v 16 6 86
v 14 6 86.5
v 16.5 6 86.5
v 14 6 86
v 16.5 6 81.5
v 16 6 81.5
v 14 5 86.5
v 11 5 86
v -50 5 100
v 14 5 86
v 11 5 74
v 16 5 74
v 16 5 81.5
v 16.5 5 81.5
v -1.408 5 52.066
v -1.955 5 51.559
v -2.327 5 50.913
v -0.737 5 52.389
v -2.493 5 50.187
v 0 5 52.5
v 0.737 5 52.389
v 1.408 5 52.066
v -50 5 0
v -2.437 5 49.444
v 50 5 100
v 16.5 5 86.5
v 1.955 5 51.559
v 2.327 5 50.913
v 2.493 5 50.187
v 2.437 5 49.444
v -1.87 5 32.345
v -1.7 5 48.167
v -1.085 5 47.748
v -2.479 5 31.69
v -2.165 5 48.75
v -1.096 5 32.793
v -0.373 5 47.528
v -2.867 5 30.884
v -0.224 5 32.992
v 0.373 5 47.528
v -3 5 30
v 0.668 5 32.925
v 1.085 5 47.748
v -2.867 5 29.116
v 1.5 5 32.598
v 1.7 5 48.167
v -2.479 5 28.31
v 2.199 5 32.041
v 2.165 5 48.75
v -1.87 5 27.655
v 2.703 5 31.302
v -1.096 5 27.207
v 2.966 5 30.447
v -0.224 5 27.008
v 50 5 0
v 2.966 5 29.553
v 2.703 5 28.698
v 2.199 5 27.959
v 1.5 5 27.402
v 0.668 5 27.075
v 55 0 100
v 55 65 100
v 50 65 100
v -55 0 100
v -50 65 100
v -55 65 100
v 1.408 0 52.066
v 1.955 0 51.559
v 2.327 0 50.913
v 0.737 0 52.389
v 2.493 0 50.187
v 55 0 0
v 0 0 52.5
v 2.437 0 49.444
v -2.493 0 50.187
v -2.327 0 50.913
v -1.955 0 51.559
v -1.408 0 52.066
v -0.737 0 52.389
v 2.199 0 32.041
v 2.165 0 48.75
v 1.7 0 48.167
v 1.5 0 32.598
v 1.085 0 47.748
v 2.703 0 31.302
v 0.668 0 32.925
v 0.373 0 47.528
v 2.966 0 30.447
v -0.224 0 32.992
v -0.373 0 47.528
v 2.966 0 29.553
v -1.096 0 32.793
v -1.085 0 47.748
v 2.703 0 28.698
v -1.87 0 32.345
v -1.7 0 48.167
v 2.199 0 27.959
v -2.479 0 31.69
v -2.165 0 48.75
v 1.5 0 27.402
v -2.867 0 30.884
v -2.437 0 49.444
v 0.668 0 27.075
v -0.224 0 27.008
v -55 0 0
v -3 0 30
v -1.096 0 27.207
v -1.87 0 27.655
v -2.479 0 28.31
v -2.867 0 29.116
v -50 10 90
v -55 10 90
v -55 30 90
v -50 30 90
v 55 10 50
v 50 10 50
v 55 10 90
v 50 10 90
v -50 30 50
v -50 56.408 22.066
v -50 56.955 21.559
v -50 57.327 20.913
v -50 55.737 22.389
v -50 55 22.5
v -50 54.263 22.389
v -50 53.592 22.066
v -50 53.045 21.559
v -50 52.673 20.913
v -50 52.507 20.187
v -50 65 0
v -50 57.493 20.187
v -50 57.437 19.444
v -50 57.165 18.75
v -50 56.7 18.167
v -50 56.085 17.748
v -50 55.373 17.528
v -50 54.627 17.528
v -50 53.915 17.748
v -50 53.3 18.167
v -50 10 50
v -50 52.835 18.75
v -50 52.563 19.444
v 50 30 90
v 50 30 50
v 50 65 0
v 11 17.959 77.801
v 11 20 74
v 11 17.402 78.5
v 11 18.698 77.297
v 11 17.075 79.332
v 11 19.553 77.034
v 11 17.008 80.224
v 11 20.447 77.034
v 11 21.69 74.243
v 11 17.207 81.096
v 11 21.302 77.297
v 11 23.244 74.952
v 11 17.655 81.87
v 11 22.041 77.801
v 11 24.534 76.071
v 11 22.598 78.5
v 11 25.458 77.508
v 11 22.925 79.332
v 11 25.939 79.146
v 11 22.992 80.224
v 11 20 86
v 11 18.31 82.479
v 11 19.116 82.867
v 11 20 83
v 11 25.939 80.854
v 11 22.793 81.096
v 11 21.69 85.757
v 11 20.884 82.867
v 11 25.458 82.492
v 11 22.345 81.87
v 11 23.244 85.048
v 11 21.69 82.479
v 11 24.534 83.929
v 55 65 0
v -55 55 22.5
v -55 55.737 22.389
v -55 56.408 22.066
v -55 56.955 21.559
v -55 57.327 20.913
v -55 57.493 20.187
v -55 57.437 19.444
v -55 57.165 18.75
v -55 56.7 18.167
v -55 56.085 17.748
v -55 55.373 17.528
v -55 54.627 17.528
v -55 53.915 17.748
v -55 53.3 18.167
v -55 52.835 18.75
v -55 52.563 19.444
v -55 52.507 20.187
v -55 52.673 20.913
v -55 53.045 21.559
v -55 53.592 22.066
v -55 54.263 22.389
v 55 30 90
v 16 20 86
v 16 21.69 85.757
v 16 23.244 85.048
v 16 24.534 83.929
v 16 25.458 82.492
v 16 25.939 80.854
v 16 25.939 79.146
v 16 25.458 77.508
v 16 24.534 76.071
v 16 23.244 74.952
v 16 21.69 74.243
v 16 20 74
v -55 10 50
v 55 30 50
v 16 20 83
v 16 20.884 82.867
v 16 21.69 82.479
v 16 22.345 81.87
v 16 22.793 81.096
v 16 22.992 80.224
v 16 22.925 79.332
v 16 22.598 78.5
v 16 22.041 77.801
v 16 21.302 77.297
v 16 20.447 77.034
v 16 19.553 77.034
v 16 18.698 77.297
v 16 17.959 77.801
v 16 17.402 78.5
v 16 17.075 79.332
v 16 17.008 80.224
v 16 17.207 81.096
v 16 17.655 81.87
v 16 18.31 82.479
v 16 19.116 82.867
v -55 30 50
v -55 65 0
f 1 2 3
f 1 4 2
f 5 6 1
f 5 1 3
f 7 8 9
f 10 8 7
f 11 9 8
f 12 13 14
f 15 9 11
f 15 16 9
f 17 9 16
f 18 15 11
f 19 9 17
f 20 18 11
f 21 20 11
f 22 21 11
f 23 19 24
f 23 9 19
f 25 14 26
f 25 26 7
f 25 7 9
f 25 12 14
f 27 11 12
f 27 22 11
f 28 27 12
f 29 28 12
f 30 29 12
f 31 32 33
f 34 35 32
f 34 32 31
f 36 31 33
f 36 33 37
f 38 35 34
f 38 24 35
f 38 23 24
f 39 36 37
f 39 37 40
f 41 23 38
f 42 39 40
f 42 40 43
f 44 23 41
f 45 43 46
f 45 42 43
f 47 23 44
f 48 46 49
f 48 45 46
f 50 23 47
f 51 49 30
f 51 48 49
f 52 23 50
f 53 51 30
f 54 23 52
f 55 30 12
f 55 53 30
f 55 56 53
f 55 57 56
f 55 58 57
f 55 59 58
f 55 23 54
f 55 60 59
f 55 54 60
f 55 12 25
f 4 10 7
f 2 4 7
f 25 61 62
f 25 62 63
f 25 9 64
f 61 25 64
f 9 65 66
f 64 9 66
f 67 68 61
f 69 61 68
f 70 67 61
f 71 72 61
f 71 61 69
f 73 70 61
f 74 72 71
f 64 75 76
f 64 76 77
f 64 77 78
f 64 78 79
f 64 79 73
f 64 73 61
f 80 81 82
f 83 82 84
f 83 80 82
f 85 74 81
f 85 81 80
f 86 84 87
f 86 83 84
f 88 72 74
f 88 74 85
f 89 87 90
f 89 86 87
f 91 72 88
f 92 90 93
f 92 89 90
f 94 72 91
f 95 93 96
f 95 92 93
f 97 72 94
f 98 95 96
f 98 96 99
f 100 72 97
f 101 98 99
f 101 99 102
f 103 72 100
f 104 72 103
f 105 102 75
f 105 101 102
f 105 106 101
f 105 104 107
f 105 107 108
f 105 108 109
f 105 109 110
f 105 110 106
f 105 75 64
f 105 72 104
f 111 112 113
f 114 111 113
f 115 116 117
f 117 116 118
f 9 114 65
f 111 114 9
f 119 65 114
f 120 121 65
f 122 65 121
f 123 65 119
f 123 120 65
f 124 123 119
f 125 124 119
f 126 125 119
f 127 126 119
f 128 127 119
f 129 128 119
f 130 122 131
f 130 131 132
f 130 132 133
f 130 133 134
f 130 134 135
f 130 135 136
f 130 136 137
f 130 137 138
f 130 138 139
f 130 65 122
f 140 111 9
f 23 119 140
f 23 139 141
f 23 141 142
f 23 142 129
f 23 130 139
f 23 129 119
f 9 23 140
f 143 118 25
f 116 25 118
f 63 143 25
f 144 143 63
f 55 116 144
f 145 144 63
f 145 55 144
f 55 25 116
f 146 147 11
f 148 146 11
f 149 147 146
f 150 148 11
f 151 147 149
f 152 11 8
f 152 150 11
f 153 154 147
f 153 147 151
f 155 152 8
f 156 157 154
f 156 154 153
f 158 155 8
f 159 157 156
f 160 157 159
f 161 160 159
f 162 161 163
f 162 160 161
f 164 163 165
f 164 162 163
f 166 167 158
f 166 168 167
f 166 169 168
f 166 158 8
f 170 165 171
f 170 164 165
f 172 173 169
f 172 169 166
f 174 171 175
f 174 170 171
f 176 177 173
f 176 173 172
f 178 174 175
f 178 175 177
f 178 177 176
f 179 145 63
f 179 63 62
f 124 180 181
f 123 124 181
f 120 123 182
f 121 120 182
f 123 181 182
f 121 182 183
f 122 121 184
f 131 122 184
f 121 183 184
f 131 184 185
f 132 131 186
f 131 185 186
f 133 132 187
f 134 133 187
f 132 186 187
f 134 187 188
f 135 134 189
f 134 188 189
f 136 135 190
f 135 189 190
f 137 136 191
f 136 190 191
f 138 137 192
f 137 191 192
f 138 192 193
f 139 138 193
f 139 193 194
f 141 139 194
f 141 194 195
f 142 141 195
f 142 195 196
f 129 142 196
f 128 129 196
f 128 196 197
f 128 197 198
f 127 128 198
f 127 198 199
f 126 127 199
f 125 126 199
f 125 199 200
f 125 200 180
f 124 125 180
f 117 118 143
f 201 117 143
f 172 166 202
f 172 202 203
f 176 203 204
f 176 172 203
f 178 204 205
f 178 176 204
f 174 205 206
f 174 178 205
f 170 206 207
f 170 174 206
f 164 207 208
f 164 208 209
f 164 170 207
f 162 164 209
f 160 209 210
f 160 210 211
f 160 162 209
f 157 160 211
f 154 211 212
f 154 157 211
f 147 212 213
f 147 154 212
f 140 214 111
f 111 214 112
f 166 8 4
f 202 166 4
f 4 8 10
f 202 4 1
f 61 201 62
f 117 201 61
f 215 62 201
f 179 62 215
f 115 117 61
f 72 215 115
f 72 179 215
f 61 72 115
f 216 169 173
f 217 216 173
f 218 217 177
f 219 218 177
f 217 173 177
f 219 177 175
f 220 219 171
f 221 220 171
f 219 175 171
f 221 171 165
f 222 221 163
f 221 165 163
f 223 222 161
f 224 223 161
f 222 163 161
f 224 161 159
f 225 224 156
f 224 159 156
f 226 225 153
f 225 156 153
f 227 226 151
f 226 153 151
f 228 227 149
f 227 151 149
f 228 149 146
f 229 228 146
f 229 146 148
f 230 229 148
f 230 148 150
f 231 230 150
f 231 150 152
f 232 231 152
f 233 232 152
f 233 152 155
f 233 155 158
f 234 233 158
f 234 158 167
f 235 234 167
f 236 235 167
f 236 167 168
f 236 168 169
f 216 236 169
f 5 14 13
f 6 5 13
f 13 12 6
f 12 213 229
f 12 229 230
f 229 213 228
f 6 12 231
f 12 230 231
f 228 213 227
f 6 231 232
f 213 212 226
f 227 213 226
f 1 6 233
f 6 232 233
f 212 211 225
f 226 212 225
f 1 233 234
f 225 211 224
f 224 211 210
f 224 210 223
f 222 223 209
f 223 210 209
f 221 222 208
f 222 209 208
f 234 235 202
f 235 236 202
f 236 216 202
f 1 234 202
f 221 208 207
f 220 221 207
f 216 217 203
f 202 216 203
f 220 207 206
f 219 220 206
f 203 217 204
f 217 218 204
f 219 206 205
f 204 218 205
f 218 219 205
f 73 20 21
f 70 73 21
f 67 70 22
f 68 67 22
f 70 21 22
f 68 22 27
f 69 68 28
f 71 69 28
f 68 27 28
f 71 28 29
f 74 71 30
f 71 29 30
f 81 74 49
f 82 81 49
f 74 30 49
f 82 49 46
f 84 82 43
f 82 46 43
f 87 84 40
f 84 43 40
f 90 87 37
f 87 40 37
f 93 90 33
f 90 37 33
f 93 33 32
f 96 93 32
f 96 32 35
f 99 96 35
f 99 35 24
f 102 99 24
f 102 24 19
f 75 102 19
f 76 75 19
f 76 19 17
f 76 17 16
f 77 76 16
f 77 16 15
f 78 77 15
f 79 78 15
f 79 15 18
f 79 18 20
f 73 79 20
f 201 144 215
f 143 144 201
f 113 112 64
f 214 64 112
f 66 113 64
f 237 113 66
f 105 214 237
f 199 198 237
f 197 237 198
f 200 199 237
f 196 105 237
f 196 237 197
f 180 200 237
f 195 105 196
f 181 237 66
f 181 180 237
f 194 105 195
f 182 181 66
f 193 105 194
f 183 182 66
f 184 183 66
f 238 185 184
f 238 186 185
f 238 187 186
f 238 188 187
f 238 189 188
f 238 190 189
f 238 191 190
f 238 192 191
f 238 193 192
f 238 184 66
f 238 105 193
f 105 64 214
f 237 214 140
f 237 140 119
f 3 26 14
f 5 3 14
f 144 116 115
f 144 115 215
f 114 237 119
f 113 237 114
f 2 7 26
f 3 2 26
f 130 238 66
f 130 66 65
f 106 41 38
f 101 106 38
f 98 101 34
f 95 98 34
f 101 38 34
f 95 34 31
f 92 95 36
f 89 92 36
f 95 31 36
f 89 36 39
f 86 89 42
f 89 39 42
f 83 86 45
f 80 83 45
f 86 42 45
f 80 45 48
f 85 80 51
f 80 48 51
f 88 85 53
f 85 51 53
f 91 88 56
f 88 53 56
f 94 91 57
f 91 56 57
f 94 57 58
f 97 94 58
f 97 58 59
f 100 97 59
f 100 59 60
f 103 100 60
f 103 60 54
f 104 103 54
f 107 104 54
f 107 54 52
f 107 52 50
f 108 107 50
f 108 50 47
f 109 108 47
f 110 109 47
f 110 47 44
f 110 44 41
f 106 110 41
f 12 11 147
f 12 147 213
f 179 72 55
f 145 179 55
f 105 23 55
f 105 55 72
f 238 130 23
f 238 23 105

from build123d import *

# Parameters (mm, degrees)
BOSS_EXTRUDE2_DEPTH = 100
SKETCH2_R           = 2.5
SKETCH2_R_2         = 3
CUT_EXTRUDE1_DEPTH  = 10
SKETCH3_R           = 2.5
CUT_EXTRUDE2_DEPTH  = 10
SKETCH4_R           = 2
CUT_EXTRUDE3_DEPTH  = 10
SKETCH5_W           = 40
SKETCH5_H           = 20
CUT_EXTRUDE4_DEPTH  = 163.249807396
SKETCH6_W           = 5
SKETCH6_H           = 12
BOSS_EXTRUDE3_DEPTH = 15
BOSS_EXTRUDE4_DEPTH = 5
SKETCH9_R           = 3
CUT_EXTRUDE5_DEPTH  = 7
BOSS_EXTRUDE5_DEPTH = 1


with BuildPart() as part:
    # Sketch1 → Boss-Extrude2 (new body)
    with BuildSketch(Plane.XY):
        Polygon((-50, 5), (50, 5), (50, 65), (55, 65), (55, 0), (-55, 0), (-55, 65), (-50, 65), align=None)
    extrude(amount=BOSS_EXTRUDE2_DEPTH)

    # Sketch2 → Cut-Extrude1 (cut)
    with BuildSketch(Plane(origin=(0, 5, 0), x_dir=(1, 0, 0), z_dir=(0, 1, 0))):
        with Locations(Location((0, -50, 0), (0, 0, 270))):
            Circle(SKETCH2_R)
        with Locations(Location((0, -30, 0), (0, 0, 180))):
            Circle(SKETCH2_R_2)
    extrude(amount=-CUT_EXTRUDE1_DEPTH, mode=Mode.SUBTRACT)

    # Sketch3 → Cut-Extrude2 (cut)
    with BuildSketch(Plane.ZY.offset(55)):
        with Locations((80, 20)):
            Circle(SKETCH3_R)
        with Locations((20, 55)):
            Circle(SKETCH3_R)
    extrude(amount=-CUT_EXTRUDE2_DEPTH, mode=Mode.SUBTRACT)

    # Sketch4 → Cut-Extrude3 (cut)
    with BuildSketch(Plane(origin=(55, 0, 0), x_dir=(0, 0, -1), z_dir=(1, 0, 0))):
        with Locations((-80, 15)):
            Circle(SKETCH4_R)
    extrude(amount=-CUT_EXTRUDE3_DEPTH, mode=Mode.SUBTRACT)

    # Sketch5 → Cut-Extrude4 (cut, through all)
    with BuildSketch(Plane.ZY.offset(55)):
        with Locations((70, 20)):
            Rectangle(SKETCH5_W, SKETCH5_H)
    extrude(amount=-CUT_EXTRUDE4_DEPTH, mode=Mode.SUBTRACT)

    # Sketch6 → Boss-Extrude3 (add)
    with BuildSketch(Plane(origin=(0, 5, 0), x_dir=(1, 0, 0), z_dir=(0, 1, 0))):
        with Locations((13.5, -80)):
            Rectangle(SKETCH6_W, SKETCH6_H)
    extrude(amount=BOSS_EXTRUDE3_DEPTH)

    # Sketch8 → Boss-Extrude4 (add)
    with BuildSketch(Plane.ZY.offset(-11)):
        with BuildLine():
            Line((74, 20), (86, 20))
            ThreePointArc((86, 20), (80, 26), (74, 20))
        make_face()
    extrude(amount=-BOSS_EXTRUDE4_DEPTH)

    # Sketch9 → Cut-Extrude5 (cut)
    with BuildSketch(Plane.ZY.offset(-11)):
        with Locations((80, 20)):
            Circle(SKETCH9_R)
    extrude(amount=-CUT_EXTRUDE5_DEPTH, mode=Mode.SUBTRACT)

    # Sketch10 → Boss-Extrude5 (add)
    with BuildSketch(Plane(origin=(0, 5, 0), x_dir=(1, 0, 0), z_dir=(0, 1, 0))):
        Polygon((14, -86.5), (16.5, -86.5), (16.5, -81.5), (16, -81.5), (16, -86), (14, -86), align=None)
    extrude(amount=BOSS_EXTRUDE5_DEPTH)


solid = part.part
